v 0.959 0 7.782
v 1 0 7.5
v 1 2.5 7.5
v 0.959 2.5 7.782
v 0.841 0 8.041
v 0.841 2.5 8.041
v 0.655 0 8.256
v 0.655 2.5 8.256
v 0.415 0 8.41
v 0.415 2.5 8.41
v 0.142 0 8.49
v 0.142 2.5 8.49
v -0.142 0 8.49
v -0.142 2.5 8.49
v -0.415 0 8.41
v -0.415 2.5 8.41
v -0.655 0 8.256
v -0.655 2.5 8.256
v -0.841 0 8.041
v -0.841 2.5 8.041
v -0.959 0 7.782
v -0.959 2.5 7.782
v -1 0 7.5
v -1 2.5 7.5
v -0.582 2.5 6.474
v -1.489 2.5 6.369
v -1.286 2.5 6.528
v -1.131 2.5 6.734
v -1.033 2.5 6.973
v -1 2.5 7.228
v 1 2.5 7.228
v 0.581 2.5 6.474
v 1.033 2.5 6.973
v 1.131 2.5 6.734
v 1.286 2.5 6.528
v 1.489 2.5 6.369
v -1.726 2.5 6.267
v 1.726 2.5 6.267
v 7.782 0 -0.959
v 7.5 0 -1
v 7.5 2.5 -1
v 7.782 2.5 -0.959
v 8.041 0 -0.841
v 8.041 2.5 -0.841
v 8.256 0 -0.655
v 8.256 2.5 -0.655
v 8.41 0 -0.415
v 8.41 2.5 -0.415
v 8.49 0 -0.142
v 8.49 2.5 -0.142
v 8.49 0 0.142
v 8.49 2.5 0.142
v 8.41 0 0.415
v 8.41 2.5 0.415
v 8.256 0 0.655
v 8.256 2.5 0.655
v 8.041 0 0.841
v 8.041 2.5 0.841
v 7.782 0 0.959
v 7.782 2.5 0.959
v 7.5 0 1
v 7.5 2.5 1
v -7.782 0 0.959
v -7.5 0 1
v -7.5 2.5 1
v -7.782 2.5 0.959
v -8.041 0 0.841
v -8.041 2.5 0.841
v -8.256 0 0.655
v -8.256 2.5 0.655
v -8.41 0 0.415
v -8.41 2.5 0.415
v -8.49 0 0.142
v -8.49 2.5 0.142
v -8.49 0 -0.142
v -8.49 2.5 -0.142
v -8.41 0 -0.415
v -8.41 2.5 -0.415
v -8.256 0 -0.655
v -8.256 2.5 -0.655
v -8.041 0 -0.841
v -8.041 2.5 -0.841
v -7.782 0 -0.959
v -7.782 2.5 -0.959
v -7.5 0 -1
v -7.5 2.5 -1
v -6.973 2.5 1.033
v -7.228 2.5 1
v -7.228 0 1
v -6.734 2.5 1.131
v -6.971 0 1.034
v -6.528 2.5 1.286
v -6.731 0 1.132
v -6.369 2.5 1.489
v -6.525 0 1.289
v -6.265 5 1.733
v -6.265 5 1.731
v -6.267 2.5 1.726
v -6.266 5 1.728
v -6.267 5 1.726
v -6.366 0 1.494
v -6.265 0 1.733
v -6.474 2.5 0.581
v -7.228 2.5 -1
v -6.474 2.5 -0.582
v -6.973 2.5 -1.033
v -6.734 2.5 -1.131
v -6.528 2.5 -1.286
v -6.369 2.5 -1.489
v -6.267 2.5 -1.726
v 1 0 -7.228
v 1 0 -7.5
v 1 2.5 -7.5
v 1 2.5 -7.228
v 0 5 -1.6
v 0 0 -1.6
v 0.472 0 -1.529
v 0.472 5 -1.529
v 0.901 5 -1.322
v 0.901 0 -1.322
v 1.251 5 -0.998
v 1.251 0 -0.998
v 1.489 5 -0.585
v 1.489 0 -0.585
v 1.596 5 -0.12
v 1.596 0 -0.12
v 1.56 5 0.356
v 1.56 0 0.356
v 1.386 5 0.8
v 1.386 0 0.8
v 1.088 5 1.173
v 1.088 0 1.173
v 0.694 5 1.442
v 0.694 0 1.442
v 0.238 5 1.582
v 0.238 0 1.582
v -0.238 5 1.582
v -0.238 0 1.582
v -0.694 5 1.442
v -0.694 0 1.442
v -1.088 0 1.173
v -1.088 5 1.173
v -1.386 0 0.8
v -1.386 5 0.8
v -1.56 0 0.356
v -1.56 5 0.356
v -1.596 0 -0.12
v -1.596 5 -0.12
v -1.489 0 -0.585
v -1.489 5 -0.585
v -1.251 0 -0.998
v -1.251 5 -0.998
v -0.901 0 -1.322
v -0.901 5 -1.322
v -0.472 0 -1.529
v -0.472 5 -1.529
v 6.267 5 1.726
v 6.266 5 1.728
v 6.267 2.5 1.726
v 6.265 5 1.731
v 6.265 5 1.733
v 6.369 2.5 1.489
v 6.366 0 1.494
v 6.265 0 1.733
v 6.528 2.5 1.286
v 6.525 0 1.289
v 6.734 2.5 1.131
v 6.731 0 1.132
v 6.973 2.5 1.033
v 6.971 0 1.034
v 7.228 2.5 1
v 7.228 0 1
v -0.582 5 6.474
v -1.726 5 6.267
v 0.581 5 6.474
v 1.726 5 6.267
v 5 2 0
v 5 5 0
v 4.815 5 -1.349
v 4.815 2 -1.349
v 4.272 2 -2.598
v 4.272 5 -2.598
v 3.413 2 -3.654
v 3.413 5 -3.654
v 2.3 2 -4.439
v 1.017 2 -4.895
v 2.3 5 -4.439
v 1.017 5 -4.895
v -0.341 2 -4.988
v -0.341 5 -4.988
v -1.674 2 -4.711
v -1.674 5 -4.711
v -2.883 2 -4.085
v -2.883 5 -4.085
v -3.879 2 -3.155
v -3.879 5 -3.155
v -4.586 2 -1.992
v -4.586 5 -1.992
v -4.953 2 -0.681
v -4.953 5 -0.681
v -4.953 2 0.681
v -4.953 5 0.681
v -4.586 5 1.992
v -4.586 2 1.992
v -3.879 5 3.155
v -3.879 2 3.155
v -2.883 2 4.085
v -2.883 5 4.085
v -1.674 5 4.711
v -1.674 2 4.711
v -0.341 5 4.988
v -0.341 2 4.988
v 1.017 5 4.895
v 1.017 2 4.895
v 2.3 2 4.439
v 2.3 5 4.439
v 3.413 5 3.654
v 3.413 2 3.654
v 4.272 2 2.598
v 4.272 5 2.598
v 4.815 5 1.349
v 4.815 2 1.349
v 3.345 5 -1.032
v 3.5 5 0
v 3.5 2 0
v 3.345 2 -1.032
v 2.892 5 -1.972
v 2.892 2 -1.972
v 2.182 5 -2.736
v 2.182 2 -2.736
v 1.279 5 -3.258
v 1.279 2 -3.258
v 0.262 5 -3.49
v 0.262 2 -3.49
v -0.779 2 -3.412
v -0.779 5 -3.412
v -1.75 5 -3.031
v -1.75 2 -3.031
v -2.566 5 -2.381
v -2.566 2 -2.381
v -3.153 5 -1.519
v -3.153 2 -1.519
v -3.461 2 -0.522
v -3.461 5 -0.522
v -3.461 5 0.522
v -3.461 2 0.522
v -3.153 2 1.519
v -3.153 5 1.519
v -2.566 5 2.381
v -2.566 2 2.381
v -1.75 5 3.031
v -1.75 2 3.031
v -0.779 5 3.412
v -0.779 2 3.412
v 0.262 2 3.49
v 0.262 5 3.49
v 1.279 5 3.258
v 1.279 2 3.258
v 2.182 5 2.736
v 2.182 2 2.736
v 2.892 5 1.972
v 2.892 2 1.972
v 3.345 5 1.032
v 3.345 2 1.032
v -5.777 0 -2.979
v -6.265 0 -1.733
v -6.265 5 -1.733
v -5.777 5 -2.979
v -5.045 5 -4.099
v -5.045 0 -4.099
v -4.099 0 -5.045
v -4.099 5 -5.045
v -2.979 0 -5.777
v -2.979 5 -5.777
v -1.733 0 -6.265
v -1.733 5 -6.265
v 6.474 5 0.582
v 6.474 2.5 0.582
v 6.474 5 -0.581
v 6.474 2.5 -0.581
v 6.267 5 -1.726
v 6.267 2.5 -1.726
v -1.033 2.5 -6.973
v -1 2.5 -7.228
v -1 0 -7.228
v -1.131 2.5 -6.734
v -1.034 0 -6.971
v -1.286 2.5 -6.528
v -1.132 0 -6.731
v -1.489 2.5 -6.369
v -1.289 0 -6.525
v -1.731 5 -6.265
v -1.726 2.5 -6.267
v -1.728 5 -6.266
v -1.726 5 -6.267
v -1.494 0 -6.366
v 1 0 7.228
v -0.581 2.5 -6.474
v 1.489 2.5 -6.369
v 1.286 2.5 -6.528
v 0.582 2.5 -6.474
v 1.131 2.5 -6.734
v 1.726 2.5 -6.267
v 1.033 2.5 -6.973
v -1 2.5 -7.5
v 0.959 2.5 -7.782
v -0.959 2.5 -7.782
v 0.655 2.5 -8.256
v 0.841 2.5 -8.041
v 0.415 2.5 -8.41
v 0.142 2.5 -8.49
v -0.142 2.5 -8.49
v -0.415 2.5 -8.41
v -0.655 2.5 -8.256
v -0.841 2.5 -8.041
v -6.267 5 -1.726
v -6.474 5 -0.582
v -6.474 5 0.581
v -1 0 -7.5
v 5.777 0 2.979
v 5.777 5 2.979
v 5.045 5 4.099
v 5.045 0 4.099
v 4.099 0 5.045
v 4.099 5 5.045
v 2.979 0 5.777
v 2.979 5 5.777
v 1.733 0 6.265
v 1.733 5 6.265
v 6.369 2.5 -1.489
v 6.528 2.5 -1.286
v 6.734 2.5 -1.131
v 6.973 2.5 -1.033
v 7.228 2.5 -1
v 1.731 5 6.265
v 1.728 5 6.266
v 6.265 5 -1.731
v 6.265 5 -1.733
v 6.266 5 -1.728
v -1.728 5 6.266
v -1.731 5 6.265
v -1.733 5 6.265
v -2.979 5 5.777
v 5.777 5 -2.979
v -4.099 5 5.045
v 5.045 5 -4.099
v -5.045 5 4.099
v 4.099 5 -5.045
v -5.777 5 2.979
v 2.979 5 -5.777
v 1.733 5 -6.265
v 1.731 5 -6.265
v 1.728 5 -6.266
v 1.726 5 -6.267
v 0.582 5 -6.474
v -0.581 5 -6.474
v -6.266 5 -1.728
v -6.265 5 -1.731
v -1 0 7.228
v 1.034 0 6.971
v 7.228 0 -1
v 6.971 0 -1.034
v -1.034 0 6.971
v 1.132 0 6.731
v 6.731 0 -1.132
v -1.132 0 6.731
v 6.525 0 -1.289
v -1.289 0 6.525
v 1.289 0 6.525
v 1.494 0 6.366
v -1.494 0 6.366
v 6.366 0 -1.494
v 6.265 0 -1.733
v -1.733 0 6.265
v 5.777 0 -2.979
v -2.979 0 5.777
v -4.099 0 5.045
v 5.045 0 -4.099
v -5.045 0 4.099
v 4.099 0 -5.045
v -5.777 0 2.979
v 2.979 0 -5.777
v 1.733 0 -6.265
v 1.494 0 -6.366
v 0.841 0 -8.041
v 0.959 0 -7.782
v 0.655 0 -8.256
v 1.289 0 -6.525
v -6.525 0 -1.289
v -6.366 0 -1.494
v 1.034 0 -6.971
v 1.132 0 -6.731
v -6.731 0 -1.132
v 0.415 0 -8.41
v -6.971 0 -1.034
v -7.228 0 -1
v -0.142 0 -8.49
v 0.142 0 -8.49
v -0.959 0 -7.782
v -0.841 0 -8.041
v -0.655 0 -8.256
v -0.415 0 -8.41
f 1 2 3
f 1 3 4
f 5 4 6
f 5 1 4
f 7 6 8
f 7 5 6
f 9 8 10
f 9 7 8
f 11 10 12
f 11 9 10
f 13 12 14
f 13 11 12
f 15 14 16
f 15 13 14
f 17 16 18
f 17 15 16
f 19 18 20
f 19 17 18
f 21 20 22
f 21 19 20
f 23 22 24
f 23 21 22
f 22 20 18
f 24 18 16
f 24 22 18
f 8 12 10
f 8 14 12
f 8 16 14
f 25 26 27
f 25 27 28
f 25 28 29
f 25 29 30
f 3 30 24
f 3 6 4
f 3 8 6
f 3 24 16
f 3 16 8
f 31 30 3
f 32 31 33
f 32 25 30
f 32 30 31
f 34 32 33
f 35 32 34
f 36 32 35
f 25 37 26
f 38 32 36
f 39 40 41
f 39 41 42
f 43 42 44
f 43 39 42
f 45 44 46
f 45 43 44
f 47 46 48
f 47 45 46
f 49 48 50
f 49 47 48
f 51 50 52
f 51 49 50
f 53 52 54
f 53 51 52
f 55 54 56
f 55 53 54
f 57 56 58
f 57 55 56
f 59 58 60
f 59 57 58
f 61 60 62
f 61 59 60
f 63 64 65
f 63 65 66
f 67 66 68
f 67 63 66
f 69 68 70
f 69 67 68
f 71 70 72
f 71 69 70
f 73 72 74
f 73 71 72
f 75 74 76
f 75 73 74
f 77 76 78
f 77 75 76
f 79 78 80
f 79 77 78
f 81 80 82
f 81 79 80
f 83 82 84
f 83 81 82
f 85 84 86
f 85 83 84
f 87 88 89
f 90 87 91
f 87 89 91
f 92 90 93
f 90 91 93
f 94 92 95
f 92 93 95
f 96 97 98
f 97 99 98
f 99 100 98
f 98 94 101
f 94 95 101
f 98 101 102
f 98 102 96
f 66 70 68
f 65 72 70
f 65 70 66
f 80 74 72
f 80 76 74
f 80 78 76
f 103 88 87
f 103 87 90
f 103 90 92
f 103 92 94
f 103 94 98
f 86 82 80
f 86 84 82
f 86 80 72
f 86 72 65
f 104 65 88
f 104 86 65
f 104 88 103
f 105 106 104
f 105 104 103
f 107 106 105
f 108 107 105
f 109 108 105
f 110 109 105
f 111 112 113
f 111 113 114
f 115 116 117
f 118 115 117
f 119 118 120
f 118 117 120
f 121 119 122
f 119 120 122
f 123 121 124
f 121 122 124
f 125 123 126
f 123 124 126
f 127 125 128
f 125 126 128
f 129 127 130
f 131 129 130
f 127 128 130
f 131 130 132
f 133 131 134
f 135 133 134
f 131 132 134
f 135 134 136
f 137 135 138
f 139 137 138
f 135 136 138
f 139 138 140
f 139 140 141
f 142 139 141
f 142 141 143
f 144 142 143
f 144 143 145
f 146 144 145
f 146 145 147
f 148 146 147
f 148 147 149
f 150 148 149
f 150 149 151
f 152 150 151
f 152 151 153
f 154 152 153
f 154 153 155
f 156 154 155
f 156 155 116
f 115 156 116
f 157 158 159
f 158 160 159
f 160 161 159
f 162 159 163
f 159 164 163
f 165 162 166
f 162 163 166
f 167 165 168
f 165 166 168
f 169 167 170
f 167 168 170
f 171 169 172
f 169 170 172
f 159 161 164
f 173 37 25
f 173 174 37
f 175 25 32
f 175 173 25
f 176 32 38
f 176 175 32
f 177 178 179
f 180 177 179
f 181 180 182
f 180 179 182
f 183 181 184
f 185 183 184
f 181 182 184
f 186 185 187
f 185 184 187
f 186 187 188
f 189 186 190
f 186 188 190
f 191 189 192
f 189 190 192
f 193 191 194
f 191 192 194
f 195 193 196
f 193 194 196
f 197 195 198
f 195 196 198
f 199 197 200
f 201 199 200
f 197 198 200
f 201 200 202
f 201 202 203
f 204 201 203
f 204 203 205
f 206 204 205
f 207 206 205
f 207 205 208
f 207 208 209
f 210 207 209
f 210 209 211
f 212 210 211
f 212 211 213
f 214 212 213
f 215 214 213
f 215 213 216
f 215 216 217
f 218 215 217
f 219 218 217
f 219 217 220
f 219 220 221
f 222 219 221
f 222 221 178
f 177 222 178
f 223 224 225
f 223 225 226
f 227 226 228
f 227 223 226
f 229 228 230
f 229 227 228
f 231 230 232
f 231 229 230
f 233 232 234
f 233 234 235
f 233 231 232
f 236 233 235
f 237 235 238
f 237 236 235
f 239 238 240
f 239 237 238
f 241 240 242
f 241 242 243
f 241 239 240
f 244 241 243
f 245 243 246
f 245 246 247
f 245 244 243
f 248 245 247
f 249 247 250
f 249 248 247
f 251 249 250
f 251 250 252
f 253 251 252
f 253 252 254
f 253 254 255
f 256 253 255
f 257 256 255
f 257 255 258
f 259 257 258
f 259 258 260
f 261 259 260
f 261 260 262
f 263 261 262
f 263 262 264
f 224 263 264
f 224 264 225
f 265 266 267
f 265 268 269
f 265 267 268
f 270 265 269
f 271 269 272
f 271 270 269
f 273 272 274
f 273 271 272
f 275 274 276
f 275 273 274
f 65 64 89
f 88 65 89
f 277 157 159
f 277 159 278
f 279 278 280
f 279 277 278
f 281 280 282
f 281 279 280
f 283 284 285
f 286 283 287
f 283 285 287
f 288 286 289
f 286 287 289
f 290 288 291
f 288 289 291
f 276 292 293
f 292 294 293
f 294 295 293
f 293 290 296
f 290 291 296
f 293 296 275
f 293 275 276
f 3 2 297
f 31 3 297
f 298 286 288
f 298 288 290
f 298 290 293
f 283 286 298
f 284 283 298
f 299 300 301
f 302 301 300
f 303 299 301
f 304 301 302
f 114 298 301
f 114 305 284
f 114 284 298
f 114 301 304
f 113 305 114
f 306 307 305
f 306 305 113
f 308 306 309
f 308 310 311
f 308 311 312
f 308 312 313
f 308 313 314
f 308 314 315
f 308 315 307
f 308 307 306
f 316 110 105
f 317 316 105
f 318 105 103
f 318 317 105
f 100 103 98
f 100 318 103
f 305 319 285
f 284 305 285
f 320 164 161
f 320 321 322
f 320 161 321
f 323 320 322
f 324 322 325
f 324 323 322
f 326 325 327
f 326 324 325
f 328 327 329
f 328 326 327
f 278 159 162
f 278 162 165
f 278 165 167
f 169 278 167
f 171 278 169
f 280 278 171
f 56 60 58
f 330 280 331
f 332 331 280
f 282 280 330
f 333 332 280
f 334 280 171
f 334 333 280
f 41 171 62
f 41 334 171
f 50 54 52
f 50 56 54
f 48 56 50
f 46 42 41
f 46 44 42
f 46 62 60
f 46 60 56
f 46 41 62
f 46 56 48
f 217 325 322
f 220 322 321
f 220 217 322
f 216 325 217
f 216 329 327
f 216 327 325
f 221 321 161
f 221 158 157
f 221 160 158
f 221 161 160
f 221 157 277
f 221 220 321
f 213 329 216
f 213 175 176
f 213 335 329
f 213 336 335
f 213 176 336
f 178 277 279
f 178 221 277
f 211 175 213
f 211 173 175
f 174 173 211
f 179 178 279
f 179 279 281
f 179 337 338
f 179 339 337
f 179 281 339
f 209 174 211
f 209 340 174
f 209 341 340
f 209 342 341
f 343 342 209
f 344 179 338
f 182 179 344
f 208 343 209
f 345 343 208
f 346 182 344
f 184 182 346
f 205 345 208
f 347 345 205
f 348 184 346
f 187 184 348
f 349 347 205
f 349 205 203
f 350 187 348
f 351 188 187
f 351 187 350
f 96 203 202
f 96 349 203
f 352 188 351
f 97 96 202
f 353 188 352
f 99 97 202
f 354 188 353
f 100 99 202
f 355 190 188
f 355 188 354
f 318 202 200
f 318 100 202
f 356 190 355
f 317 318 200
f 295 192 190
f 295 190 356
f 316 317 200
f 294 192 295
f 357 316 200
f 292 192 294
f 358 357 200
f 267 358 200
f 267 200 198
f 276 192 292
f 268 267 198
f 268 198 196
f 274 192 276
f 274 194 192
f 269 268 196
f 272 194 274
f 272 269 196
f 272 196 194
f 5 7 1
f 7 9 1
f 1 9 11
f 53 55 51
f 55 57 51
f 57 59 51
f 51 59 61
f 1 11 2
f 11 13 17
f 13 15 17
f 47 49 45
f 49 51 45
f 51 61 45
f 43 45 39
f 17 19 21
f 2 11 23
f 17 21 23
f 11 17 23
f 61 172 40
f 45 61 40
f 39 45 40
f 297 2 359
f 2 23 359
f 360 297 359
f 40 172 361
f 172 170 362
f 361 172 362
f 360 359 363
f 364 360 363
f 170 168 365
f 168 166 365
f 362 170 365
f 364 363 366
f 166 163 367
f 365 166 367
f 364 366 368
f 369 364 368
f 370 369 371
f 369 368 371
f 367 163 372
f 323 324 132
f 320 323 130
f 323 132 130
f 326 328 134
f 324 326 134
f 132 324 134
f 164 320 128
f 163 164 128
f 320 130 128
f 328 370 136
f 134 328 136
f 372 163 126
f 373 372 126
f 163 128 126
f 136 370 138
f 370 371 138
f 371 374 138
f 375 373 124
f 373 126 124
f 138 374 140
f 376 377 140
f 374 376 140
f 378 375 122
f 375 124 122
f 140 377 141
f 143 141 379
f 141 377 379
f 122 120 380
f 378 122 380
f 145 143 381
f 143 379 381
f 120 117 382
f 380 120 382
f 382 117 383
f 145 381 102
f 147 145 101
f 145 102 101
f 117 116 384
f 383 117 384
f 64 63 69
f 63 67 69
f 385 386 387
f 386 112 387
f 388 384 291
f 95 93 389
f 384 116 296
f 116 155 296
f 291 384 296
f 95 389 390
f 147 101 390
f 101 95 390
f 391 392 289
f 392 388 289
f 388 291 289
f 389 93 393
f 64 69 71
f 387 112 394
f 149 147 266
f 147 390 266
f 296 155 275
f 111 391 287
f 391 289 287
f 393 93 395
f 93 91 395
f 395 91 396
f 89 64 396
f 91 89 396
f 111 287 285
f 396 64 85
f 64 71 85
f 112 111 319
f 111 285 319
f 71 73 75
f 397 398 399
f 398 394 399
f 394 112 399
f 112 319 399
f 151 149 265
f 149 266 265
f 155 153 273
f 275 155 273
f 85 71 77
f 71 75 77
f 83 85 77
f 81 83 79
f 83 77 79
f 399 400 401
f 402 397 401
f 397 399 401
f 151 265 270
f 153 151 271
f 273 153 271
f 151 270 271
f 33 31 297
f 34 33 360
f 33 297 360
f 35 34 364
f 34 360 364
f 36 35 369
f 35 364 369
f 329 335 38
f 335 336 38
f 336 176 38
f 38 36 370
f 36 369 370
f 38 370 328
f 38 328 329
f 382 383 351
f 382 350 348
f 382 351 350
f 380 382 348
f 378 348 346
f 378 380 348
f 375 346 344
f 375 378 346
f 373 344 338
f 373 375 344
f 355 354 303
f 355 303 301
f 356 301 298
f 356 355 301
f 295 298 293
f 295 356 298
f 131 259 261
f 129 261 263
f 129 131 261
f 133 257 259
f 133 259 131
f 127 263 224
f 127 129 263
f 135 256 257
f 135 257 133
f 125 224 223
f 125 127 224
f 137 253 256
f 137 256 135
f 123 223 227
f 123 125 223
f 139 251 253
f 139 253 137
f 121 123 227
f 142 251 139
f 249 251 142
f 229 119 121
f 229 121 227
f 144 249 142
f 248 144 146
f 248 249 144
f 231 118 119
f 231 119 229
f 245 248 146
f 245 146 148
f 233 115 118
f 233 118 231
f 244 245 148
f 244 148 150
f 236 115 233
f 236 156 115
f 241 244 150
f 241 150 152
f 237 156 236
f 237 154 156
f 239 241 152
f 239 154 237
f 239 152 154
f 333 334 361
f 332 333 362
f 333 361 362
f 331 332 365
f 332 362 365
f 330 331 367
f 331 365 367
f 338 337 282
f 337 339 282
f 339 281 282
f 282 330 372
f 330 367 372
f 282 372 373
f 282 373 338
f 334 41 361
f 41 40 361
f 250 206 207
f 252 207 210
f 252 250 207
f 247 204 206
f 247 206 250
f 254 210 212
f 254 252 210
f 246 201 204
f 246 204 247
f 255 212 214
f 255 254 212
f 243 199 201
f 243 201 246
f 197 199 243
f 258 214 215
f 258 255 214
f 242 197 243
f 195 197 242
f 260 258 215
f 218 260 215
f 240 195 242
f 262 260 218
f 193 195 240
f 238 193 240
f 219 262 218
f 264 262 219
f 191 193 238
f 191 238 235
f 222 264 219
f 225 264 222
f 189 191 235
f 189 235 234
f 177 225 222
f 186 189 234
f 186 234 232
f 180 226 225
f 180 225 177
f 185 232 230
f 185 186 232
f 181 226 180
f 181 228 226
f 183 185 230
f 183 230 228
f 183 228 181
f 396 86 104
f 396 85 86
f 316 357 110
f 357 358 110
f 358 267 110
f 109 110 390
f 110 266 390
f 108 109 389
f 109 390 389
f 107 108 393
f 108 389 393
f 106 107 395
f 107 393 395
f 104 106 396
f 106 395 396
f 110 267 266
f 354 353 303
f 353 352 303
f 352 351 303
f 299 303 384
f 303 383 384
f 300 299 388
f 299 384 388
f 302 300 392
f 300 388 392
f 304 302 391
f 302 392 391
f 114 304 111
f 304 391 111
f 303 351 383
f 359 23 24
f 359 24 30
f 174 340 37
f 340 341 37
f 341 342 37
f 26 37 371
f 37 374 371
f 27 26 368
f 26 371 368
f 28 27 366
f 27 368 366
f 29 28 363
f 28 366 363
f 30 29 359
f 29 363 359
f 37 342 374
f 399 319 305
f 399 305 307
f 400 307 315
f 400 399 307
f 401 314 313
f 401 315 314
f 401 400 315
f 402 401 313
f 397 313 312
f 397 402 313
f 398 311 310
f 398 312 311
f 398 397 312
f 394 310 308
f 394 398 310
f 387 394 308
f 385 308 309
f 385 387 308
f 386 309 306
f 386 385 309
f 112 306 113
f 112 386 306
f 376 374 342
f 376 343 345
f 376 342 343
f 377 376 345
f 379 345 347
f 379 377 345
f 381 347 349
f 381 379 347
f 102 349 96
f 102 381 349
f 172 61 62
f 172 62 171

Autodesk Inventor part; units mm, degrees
ref_plane "YZ Plane" through (0, 0, 0) normal (1, 0, 0) x (0, 1, 0)
ref_plane "XZ Plane" through (0, 0, 0) normal (0, 1, 0) x (-1, 0, 0)
ref_plane "XY Plane" through (0, 0, 0) normal (0, 0, 1) x (1, 0, 0)
sketch "スケッチ1" plane through (0, 0, 0) normal (0, 1, 0) x (-1, 0, 0)
  arc A0 (6.2646, 1.7333) -> (1.7333, 6.2646) centre (0, 0) ccw
  arc A1 (1, 7.5) -> (0, 8.5) centre (0, 7.5) ccw
  line L0 (1, 7.5) -> (1, 7.2284)
  line L1 (0, 1.6) -> (0, 7.5)
  line L2 (0, 7.5) -> (0, 8.5)
  line L3 (1.6, 0) -> (7.5, 0)
  line L4 (7.5, 0) -> (8.5, 0)
  arc A2 (8.5, 0) -> (7.5, 1) centre (7.5, 0) ccw
  line L5 (7.5, 1) -> (7.2284, 1)
  arc A3 (7.5, 0) -> (0, 7.5) centre (0, 0) ccw construction
  arc A4 (1, 7.2284) -> (1.7333, 6.2646) centre (2, 7.2284) ccw
  arc A5 (6.2646, 1.7333) -> (7.2284, 1) centre (7.2284, 2) ccw
  arc A6 (1.6, 0) -> (0, 1.6) centre (0, 0) ccw
  point P0 (6.4226, 1)
  point P1 (1, 6.4226)
  dimension "d0" = 1
  dimension "d1" = 6.5
  dimension "d2" = 1
  dimension "d4" = 7.5
  dimension "d18" = 1.6
extrude "押し出し1" add sketch "スケッチ1" along normal blind 5
pattern_circular "円形状パターン1" count 4 over 360 about axis through (0, -10, 0) along (0, 1, 0) of "押し出し1"
sketch "スケッチ2" plane through (0, 5, 0) normal (0, 1, 0) x (1, 0, 0)
  circle A0 centre (0, 0) radius 5
  circle A1 centre (0, 0) radius 3.5
  dimension "d10" = 1.5
  dimension "d11" = 10
extrude "押し出し3" cut sketch "スケッチ2" against normal blind 3
sketch "スケッチ3" plane through (0, 5, 0) normal (0, 1, 0) x (1, 0, 0)
  circle A0 centre (0, 0) radius 8.5
  arc A1 (-6.2646, -1.7333) -> (-1.7333, -6.2646) centre (0, 0) ccw construction
  circle A2 centre (0, 0) radius 6.5
  arc A3 (-1, -7.5) -> (1, -7.5) centre (0, -7.5) ccw construction
extrude "押し出し4" cut sketch "スケッチ3" against normal blind 2.5
properties part number "16_021_COUPLER_BASE_R1" material "ABS プラスチック"
